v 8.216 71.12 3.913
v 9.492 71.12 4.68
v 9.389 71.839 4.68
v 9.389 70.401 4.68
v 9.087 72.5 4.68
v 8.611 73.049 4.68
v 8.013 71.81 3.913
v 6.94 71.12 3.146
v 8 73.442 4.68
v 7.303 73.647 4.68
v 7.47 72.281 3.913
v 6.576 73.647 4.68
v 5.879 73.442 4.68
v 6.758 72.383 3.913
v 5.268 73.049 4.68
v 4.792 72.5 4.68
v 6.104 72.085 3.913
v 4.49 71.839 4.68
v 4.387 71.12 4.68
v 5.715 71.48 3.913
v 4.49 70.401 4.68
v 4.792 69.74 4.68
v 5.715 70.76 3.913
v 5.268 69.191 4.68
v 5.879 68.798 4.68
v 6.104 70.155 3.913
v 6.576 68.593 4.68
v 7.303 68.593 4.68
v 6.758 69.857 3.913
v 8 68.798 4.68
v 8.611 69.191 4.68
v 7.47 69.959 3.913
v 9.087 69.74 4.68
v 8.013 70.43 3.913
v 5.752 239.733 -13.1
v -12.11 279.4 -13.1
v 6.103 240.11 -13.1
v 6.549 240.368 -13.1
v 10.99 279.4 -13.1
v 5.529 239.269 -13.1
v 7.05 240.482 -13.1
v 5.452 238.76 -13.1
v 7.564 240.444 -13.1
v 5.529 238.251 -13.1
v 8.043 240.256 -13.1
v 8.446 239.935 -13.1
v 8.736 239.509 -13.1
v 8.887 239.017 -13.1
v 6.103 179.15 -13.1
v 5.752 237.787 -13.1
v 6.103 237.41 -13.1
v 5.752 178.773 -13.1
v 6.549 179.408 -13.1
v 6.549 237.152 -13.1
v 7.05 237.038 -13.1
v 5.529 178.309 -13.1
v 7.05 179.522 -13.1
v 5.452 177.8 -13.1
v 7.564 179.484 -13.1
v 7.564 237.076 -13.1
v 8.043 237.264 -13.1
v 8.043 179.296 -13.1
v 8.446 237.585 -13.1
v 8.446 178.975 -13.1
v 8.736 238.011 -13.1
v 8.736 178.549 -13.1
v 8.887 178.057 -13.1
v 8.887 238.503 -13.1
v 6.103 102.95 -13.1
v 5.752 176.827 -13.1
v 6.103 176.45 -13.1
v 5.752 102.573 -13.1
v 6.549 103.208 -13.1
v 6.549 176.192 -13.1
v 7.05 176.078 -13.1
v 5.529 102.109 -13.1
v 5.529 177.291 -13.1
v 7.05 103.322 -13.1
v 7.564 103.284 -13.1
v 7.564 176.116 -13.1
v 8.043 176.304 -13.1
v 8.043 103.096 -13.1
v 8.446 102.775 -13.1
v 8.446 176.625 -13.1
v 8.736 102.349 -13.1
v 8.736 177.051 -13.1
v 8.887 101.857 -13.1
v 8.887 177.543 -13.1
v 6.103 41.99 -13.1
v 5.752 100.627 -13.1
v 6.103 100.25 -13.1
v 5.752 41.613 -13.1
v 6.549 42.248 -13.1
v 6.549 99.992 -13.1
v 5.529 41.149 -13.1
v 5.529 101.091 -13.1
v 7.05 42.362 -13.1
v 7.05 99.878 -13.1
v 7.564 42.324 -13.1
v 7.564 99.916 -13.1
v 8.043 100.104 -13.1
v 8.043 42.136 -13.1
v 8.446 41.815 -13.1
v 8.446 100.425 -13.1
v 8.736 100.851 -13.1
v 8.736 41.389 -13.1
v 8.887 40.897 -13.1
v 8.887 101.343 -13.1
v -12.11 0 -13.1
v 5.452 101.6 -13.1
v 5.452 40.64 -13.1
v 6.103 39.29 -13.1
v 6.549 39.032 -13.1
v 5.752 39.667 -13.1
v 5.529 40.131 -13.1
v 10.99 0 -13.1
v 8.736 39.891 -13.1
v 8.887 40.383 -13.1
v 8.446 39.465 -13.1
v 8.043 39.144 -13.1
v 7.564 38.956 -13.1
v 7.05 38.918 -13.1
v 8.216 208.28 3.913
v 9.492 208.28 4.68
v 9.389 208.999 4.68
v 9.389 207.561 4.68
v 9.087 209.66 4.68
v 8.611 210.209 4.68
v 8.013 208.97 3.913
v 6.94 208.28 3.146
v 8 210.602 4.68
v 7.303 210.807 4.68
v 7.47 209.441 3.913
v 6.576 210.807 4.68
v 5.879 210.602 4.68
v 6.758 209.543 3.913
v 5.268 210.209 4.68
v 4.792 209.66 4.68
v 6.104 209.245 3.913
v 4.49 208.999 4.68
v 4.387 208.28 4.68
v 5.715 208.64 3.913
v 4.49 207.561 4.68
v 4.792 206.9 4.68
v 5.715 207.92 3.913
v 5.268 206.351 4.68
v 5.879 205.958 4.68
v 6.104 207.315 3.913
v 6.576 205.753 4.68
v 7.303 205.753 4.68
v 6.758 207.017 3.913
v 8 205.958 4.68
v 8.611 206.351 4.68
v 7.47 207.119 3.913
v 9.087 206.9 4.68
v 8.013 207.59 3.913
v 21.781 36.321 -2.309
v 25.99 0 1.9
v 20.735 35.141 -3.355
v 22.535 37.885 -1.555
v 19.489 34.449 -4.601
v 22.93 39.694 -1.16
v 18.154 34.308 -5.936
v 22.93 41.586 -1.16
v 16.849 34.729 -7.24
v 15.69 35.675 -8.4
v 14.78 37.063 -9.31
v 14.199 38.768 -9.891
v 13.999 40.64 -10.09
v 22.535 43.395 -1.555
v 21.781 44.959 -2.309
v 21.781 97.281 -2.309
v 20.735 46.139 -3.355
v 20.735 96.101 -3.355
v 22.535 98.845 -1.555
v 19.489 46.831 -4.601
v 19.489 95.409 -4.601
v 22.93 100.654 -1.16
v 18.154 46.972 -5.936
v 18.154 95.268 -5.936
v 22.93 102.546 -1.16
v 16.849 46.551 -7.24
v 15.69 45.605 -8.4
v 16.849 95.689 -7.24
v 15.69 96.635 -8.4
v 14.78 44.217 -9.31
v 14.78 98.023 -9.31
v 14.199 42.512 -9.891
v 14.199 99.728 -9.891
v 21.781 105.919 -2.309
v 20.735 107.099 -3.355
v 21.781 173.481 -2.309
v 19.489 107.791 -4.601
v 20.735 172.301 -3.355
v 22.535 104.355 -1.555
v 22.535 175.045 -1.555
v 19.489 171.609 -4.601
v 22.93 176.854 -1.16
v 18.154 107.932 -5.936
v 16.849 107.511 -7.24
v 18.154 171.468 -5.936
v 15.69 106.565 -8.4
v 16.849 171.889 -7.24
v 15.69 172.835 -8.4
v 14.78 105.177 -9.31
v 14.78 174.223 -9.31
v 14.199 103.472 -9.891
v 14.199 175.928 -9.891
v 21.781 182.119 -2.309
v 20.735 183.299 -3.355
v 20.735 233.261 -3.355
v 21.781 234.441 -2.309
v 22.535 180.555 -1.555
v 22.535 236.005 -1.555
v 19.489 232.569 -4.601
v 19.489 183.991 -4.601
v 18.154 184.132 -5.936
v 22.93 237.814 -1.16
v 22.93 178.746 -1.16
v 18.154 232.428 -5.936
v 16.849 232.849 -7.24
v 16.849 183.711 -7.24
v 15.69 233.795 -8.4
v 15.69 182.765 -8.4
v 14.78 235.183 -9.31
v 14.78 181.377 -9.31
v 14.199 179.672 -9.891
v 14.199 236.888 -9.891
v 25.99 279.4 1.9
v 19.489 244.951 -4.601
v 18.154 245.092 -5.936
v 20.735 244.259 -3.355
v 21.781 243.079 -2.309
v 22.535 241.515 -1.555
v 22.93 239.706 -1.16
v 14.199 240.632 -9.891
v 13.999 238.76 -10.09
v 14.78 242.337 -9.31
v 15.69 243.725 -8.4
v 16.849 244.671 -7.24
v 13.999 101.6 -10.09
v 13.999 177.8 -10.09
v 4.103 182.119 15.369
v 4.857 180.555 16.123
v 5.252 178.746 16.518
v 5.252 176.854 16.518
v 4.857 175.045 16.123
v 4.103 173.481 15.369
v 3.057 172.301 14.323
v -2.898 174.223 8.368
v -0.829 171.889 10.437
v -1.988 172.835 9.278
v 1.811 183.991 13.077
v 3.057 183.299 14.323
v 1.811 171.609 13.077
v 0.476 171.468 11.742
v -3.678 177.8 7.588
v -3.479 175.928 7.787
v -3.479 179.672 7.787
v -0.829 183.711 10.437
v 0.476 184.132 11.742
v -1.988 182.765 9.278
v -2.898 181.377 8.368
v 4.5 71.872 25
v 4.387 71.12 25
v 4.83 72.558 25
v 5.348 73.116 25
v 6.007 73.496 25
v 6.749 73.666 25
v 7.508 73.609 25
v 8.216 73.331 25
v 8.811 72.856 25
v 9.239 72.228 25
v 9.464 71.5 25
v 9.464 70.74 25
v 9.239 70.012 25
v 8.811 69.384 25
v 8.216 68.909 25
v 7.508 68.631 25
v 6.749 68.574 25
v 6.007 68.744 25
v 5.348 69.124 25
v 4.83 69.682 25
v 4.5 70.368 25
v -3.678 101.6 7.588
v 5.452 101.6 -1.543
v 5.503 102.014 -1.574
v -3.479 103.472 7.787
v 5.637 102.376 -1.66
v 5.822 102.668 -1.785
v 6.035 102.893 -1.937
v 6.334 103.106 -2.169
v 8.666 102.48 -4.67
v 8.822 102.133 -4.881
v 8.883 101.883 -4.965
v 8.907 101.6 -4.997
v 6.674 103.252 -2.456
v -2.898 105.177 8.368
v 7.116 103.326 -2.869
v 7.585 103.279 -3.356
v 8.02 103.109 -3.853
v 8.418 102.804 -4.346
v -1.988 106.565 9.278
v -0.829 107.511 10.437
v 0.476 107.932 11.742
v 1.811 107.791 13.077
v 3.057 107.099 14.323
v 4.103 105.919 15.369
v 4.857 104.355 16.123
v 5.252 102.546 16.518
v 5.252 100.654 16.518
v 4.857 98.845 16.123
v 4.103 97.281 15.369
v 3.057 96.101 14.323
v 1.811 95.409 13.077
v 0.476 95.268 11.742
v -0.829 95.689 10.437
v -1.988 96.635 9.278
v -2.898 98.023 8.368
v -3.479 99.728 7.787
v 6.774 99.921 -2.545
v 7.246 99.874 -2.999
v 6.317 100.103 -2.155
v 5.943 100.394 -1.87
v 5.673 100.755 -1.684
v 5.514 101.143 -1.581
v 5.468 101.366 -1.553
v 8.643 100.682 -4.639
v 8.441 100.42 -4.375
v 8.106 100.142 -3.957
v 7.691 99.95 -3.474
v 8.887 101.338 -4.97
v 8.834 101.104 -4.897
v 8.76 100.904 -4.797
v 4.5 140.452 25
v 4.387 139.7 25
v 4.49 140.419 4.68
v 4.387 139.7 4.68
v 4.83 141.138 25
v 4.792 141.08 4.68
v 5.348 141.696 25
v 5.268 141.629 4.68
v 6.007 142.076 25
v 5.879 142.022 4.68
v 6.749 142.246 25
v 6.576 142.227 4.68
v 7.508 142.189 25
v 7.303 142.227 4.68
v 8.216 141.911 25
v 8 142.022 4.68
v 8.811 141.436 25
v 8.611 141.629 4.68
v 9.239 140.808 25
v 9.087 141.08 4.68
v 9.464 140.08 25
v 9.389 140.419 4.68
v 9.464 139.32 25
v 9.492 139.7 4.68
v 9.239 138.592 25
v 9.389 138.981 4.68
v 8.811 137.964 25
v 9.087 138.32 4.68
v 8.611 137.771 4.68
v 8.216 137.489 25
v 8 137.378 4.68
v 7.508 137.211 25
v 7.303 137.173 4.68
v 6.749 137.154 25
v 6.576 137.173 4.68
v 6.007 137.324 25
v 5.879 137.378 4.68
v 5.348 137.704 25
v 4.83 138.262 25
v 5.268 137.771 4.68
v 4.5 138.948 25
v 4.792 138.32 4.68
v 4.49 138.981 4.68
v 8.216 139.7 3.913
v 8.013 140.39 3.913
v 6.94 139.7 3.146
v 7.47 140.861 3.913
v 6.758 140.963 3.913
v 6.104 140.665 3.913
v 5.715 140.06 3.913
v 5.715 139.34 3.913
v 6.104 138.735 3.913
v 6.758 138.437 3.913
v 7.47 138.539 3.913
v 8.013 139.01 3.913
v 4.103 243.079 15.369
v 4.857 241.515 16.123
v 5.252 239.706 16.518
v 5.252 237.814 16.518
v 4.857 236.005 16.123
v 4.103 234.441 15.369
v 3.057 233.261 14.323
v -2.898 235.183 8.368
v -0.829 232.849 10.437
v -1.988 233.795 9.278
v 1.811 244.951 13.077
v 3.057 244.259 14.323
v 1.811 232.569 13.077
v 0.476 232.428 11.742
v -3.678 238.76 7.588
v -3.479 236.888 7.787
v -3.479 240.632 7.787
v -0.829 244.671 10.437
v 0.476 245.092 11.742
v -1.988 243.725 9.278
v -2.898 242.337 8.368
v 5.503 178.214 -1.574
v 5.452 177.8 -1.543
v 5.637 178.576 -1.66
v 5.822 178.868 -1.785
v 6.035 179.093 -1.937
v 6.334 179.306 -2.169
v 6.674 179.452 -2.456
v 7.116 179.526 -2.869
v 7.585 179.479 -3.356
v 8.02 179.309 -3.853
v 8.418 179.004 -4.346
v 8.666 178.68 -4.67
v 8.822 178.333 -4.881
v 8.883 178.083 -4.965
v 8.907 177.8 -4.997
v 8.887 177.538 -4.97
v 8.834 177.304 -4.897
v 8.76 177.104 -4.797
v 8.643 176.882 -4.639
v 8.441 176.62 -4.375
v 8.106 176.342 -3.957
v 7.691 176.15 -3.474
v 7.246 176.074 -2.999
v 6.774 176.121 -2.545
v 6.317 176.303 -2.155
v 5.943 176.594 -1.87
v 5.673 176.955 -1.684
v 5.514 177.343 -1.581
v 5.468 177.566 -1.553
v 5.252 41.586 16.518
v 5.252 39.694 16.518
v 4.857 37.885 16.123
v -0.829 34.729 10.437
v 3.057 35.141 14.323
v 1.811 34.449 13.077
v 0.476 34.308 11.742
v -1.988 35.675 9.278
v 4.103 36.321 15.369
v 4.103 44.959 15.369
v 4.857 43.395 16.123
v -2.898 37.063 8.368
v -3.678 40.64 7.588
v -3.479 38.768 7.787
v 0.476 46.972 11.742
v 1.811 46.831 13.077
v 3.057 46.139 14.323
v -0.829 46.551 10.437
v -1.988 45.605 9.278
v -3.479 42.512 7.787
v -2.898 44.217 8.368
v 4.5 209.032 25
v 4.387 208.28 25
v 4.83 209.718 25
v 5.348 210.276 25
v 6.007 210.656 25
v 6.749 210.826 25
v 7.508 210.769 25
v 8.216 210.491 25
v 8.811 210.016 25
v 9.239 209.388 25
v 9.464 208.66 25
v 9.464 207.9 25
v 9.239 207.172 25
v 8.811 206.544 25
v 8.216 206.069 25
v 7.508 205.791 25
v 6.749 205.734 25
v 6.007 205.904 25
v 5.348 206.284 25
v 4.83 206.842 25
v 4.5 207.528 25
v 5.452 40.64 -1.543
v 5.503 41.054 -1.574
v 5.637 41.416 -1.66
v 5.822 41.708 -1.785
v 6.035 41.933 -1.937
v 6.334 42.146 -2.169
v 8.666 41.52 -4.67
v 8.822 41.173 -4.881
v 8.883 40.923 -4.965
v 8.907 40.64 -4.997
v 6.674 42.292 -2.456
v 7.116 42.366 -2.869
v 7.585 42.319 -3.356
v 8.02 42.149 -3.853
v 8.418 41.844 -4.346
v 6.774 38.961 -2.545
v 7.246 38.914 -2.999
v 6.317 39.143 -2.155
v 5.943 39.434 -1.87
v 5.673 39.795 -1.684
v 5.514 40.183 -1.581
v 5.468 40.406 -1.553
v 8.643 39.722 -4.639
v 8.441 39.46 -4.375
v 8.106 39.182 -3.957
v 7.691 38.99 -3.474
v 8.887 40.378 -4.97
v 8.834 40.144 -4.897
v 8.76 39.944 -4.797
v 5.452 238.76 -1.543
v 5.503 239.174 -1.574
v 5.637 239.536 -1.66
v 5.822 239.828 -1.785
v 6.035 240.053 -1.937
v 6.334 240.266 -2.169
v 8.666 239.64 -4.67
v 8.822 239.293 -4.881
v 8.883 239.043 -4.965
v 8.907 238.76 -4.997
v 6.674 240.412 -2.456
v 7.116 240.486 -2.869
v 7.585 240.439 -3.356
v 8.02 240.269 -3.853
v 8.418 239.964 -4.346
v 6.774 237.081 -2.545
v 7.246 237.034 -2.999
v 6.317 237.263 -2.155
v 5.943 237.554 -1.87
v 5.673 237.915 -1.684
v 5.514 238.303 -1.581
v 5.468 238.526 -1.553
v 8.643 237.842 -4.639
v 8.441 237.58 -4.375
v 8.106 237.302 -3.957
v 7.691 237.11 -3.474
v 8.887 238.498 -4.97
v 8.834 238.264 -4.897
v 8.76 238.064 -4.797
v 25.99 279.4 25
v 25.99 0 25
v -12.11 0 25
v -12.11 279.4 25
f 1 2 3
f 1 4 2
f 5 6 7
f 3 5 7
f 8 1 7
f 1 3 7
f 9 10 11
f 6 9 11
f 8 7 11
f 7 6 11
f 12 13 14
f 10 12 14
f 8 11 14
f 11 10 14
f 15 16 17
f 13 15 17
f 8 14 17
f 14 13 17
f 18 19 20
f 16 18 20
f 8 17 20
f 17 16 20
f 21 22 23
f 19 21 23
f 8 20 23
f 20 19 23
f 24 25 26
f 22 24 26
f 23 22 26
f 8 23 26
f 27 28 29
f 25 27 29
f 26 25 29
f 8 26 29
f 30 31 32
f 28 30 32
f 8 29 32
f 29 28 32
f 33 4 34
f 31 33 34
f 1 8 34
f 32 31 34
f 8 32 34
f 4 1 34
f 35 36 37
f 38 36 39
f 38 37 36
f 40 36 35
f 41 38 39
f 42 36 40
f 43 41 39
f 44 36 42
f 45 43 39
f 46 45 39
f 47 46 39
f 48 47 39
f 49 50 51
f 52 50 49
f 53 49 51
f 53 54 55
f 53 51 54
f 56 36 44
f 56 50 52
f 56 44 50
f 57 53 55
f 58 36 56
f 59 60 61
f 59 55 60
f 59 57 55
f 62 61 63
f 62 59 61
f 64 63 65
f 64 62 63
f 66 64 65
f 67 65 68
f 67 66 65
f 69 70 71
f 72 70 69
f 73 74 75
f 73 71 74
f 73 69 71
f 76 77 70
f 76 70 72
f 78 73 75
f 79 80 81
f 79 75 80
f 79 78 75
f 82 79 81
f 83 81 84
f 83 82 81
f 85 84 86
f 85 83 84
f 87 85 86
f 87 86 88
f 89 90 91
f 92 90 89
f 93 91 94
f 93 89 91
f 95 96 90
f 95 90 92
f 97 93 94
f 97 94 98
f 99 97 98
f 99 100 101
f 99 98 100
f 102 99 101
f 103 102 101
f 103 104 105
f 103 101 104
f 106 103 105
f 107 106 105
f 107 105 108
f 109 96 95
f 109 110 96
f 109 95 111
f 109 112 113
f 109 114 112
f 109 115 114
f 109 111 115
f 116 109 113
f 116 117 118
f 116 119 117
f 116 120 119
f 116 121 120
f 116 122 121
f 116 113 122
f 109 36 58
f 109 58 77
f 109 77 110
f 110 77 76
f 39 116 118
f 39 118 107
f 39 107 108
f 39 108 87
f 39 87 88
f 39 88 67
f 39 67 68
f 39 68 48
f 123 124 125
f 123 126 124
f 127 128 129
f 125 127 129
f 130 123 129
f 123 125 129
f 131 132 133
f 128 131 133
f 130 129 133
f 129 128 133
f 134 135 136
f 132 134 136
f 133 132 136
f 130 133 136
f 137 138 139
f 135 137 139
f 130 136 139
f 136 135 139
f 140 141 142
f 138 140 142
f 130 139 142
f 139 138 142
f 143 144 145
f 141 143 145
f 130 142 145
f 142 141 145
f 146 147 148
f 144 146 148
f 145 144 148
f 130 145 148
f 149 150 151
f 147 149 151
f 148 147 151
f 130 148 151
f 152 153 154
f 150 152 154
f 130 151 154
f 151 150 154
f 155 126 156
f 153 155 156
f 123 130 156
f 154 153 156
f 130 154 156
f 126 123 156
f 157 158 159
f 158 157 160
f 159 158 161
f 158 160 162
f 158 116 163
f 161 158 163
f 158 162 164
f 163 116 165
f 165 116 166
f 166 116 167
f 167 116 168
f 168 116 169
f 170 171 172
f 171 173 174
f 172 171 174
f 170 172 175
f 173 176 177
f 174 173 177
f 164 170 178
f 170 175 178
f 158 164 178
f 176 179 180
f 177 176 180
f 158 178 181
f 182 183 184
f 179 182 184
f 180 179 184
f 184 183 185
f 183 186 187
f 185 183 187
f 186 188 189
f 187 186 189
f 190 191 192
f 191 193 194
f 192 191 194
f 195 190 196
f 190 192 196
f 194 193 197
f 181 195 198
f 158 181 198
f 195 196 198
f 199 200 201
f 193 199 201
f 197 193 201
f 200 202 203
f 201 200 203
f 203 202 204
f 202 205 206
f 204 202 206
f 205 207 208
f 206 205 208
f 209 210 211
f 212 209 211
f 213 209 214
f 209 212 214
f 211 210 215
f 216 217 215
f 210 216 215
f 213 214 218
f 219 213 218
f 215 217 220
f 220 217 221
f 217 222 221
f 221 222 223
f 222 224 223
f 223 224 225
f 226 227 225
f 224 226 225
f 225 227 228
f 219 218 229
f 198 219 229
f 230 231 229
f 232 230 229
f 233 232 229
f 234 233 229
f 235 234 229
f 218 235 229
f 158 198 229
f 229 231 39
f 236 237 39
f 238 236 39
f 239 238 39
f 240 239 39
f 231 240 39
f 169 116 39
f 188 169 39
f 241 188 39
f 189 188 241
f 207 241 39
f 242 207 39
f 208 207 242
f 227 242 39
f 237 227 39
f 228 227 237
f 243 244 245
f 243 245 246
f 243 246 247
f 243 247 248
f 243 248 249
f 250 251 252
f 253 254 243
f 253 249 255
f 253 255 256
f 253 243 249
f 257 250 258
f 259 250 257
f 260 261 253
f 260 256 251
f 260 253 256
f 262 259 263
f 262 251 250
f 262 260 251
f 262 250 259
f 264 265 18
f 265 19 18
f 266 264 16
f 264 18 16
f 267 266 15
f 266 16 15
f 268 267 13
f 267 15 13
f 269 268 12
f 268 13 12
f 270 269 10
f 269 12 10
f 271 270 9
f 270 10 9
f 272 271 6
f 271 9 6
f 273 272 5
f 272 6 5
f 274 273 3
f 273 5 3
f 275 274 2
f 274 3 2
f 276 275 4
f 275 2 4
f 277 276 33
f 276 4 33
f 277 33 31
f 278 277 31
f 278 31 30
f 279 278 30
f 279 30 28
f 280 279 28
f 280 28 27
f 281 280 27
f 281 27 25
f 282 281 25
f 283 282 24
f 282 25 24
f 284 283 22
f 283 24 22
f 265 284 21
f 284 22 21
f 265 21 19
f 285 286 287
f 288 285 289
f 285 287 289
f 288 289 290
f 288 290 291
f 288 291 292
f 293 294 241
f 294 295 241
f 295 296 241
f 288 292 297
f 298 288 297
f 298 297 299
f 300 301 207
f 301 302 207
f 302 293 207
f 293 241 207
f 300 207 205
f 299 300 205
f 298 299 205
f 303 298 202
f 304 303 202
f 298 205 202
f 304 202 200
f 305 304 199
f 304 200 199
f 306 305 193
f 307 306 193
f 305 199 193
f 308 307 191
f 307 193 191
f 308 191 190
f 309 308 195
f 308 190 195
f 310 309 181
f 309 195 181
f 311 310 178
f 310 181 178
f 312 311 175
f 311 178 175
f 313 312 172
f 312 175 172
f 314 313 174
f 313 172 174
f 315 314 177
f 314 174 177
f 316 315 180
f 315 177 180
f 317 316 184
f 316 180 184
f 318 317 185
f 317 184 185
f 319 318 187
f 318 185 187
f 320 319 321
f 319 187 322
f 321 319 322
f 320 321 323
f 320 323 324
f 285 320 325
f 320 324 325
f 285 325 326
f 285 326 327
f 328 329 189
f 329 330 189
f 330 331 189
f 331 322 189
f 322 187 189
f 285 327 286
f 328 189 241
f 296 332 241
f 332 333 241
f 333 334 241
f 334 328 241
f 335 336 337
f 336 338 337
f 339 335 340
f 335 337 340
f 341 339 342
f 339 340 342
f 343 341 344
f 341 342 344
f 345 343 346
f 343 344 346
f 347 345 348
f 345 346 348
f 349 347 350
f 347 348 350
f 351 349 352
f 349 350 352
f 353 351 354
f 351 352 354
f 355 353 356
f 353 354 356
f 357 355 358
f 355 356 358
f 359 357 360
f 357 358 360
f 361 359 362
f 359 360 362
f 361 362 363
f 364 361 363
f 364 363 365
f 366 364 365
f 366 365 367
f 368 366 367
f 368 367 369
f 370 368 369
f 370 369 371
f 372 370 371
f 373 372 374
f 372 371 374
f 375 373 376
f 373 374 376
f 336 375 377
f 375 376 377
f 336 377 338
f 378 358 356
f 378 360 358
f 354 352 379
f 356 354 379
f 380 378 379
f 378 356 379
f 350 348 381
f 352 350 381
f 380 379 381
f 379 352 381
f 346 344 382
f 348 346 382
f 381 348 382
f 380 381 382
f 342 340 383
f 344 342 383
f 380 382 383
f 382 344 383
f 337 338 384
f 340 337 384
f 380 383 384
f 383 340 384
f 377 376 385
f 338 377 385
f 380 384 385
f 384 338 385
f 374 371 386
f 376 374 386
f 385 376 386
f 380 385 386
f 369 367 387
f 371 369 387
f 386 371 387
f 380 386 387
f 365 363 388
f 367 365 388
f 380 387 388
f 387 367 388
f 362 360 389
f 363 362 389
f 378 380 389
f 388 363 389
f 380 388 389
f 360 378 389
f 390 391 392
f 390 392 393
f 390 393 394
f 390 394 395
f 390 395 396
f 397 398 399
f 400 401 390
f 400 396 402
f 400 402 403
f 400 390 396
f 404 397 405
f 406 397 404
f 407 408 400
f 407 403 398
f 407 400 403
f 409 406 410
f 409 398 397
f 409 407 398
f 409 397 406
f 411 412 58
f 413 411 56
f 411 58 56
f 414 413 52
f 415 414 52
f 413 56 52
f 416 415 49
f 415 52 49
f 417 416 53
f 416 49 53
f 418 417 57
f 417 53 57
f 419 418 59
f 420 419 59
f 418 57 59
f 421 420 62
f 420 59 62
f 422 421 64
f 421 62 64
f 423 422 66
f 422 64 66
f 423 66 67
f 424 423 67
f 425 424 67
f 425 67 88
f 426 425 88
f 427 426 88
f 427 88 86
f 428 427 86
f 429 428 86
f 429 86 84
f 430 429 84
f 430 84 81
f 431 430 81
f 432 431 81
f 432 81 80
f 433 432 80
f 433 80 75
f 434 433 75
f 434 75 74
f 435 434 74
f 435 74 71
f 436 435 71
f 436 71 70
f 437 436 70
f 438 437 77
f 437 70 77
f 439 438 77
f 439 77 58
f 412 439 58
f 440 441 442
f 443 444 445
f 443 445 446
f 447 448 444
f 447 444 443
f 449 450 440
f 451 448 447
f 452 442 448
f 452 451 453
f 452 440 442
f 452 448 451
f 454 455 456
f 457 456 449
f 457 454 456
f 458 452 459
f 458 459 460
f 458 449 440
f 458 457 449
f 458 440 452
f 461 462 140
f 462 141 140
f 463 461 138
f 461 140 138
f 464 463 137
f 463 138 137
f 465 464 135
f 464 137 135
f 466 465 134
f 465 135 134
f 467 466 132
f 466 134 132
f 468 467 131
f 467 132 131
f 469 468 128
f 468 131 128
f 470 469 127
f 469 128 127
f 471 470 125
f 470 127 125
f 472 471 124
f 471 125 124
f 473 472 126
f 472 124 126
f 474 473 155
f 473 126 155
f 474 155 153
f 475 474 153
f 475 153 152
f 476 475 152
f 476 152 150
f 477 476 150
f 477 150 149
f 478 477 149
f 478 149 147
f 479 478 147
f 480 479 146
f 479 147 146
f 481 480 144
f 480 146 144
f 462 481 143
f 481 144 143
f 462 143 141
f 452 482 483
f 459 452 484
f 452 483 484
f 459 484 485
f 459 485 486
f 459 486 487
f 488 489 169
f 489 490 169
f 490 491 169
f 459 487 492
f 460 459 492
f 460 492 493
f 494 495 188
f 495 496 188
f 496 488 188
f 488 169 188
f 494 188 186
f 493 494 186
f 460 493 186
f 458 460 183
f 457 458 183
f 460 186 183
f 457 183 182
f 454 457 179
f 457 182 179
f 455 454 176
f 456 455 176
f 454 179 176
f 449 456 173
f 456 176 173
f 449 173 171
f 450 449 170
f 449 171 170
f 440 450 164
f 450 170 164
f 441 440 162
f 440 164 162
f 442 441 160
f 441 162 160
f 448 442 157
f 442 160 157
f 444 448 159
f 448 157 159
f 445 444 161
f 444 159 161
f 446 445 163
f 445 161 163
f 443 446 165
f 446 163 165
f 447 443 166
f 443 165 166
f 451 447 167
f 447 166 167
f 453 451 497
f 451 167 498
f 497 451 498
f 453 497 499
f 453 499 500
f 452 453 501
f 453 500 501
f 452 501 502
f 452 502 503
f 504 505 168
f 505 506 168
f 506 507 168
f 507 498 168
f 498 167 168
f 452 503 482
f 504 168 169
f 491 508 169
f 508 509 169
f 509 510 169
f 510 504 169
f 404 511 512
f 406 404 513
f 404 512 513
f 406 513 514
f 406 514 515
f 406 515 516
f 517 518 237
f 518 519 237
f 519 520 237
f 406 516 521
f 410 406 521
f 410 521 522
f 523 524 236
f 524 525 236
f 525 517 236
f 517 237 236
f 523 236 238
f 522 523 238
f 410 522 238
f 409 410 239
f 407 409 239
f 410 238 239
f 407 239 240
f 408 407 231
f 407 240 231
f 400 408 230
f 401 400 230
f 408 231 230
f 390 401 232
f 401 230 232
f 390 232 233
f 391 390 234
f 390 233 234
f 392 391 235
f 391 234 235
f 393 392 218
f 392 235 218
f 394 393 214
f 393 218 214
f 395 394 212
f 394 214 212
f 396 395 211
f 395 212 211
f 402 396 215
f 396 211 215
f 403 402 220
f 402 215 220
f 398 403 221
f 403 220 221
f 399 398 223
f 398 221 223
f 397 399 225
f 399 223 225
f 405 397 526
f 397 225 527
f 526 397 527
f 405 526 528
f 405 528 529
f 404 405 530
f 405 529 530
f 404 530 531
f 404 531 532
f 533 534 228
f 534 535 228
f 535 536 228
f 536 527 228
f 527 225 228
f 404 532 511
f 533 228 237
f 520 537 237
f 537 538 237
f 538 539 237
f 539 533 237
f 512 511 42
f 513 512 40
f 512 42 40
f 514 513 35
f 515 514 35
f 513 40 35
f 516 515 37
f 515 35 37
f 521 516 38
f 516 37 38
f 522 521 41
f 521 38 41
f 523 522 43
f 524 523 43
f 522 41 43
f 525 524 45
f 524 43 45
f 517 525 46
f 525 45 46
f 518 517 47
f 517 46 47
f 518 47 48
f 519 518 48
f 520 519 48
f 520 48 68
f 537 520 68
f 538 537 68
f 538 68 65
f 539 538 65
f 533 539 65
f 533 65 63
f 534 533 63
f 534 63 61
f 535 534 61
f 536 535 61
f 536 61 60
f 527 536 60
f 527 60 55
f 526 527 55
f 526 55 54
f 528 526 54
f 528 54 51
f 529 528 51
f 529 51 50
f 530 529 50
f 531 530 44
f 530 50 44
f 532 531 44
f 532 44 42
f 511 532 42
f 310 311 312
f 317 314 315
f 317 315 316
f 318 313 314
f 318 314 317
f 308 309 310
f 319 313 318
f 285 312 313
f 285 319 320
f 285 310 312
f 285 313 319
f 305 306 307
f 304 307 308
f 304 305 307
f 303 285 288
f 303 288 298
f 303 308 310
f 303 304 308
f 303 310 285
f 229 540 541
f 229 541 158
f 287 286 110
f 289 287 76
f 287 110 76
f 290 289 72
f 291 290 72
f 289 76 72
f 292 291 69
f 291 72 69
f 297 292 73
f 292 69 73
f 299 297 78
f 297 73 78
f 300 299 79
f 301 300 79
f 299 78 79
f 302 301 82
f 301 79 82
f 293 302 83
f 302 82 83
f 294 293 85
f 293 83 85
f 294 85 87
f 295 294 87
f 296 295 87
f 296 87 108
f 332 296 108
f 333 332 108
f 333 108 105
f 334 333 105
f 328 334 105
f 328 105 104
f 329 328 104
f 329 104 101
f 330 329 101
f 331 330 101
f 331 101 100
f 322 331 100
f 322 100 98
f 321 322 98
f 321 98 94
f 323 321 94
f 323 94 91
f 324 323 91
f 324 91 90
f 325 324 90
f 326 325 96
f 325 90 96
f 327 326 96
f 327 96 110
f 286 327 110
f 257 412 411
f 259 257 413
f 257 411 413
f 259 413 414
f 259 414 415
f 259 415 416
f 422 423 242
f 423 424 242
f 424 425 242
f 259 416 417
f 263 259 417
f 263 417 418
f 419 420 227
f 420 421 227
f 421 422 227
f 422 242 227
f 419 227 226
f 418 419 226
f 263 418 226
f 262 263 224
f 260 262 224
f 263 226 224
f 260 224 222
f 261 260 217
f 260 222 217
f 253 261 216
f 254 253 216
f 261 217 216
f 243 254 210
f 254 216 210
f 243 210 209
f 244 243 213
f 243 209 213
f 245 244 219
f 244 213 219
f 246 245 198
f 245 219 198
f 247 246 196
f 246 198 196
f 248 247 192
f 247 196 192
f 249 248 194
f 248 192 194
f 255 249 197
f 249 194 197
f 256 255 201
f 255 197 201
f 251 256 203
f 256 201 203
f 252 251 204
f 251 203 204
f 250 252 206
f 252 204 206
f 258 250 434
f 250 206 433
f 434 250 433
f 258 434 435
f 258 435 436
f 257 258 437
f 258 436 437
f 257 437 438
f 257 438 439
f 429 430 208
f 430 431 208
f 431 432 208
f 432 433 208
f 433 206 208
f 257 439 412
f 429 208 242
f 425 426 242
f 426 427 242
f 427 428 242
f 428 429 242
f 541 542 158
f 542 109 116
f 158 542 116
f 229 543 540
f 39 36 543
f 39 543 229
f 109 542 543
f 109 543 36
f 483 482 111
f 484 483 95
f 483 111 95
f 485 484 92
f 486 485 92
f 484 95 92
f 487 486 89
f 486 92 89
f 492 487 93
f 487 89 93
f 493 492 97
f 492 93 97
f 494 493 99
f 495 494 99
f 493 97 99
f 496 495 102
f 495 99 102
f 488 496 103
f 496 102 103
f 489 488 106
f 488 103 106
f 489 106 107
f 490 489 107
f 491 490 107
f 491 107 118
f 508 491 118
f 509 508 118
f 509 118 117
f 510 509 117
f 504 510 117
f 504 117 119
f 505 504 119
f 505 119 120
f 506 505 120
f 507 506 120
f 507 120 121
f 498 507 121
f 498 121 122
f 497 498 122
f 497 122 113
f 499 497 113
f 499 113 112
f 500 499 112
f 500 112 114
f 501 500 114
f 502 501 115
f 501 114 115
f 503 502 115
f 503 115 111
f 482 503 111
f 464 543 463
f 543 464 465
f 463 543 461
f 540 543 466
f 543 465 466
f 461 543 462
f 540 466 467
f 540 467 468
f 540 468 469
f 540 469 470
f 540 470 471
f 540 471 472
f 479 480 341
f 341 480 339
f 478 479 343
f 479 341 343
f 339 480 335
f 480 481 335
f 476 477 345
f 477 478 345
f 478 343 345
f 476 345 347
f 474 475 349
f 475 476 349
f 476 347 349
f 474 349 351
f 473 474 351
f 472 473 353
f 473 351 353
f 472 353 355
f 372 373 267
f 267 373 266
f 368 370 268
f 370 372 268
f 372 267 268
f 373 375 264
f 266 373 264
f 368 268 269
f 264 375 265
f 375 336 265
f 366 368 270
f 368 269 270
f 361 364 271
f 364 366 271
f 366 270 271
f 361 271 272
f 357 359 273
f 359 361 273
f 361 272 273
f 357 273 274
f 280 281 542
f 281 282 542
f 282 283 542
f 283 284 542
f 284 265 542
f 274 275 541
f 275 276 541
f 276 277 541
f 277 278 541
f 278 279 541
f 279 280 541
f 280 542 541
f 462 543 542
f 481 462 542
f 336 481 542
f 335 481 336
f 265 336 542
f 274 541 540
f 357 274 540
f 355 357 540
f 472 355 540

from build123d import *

# Parameters (mm, degrees)
SKETCH1_W                   = 38.1
SKETCH1_H                   = 38.1
BOSS_EXTRUDE1_DEPTH         = 279.4
CHAMFER1_SIZE               = 15
SKETCH15_R                  = 6.35
CUT_EXTRUDE2_DEPTH          = 25
F_1_4_20_TAPPED_HOLE1_D     = 5.1054
F_1_4_20_TAPPED_HOLE1_DEPTH = 20.32
F_1_4_20_TAPPED_HOLE1_TIP   = 1.533816902
F_8_32_TAPPED_HOLE1_REACH   = 285.181
F_8_32_TAPPED_HOLE1_BORE_R  = 1.7272


with BuildPart() as part:
    # Sketch1 → Boss-Extrude1 (new body)
    with BuildSketch(Plane(origin=(0, 0, 0), x_dir=(1, 0, 0), z_dir=(0, 1, 0))):
        with Locations((6.939567467, -5.95)):
            Rectangle(SKETCH1_W, SKETCH1_H)
    extrude(amount=BOSS_EXTRUDE1_DEPTH)

    # Chamfer1
    chamfer1_edges = [part.edges().sort_by_distance(p)[0] for p in [
        (25.989567467, 139.7, -13.1),
    ]]
    chamfer(chamfer1_edges, length=CHAMFER1_SIZE)

    # Sketch15 → Cut-Extrude2 (cut)
    with BuildSketch(Plane(origin=(12.044783734, 0, -12.044783734), x_dir=(-0.7071067811865465, 0, -0.7071067811865487), z_dir=(0.7071067811865487, 0, -0.7071067811865465))):
        with Locations((-9.114300563, 238.76)):
            Circle(SKETCH15_R)
        with Locations((-9.114300563, 177.8)):
            Circle(SKETCH15_R)
        with Locations((-9.114300563, 101.6)):
            Circle(SKETCH15_R)
        with Locations((-9.114300563, 40.64)):
            Circle(SKETCH15_R)
    extrude(amount=-CUT_EXTRUDE2_DEPTH, mode=Mode.SUBTRACT)

    # 1/4-20 Tapped Hole1
    with Locations(Plane.XY.offset(25)):
        with Locations((6.939567467, 208.28), (6.939567467, 139.7), (6.939567467, 71.12)):
            Hole(F_1_4_20_TAPPED_HOLE1_D / 2, depth=F_1_4_20_TAPPED_HOLE1_DEPTH)
            with Locations((0, 0, -(F_1_4_20_TAPPED_HOLE1_DEPTH + F_1_4_20_TAPPED_HOLE1_TIP / 2))):  # 118° drill point
                Cone(0, F_1_4_20_TAPPED_HOLE1_D / 2, F_1_4_20_TAPPED_HOLE1_TIP, mode=Mode.SUBTRACT)

    # #8-32 Tapped Hole1 bore → #8-32 Tapped Hole1 (cut, up to next)
    with BuildSketch(Plane(origin=(0, 0, -13.1), x_dir=(-1, 0, 0), z_dir=(0, 0, -1)), mode=Mode.PRIVATE) as f_8_32_tapped_hole1_sk1:
        with Locations((-7.179567467, 40.64)):
            Circle(F_8_32_TAPPED_HOLE1_BORE_R)
    f_8_32_tapped_hole1_tool1 = extrude(f_8_32_tapped_hole1_sk1.sketch, amount=-F_8_32_TAPPED_HOLE1_REACH, mode=Mode.PRIVATE) & part.part
    # #8-32 Tapped Hole1 bore → #8-32 Tapped Hole1 (cut, up to next)
    with BuildSketch(Plane(origin=(0, 0, -13.1), x_dir=(-1, 0, 0), z_dir=(0, 0, -1)), mode=Mode.PRIVATE) as f_8_32_tapped_hole1_sk2:
        with Locations((-7.179567467, 101.6)):
            Circle(F_8_32_TAPPED_HOLE1_BORE_R)
    f_8_32_tapped_hole1_tool2 = extrude(f_8_32_tapped_hole1_sk2.sketch, amount=-F_8_32_TAPPED_HOLE1_REACH, mode=Mode.PRIVATE) & part.part
    # #8-32 Tapped Hole1 bore → #8-32 Tapped Hole1 (cut, up to next)
    with BuildSketch(Plane(origin=(0, 0, -13.1), x_dir=(-1, 0, 0), z_dir=(0, 0, -1)), mode=Mode.PRIVATE) as f_8_32_tapped_hole1_sk3:
        with Locations((-7.179567467, 177.8)):
            Circle(F_8_32_TAPPED_HOLE1_BORE_R)
    f_8_32_tapped_hole1_tool3 = extrude(f_8_32_tapped_hole1_sk3.sketch, amount=-F_8_32_TAPPED_HOLE1_REACH, mode=Mode.PRIVATE) & part.part
    # #8-32 Tapped Hole1 bore → #8-32 Tapped Hole1 (cut, up to next)
    with BuildSketch(Plane(origin=(0, 0, -13.1), x_dir=(-1, 0, 0), z_dir=(0, 0, -1)), mode=Mode.PRIVATE) as f_8_32_tapped_hole1_sk4:
        with Locations((-7.179567467, 238.76)):
            Circle(F_8_32_TAPPED_HOLE1_BORE_R)
    f_8_32_tapped_hole1_tool4 = extrude(f_8_32_tapped_hole1_sk4.sketch, amount=-F_8_32_TAPPED_HOLE1_REACH, mode=Mode.PRIVATE) & part.part
    add(f_8_32_tapped_hole1_tool1.solids().sort_by_distance((7.179567, 40.64, -13.1))[0], mode=Mode.SUBTRACT)
    add(f_8_32_tapped_hole1_tool2.solids().sort_by_distance((7.179567, 101.6, -13.1))[0], mode=Mode.SUBTRACT)
    add(f_8_32_tapped_hole1_tool3.solids().sort_by_distance((7.179567, 177.8, -13.1))[0], mode=Mode.SUBTRACT)
    add(f_8_32_tapped_hole1_tool4.solids().sort_by_distance((7.179567, 238.76, -13.1))[0], mode=Mode.SUBTRACT)


solid = part.part
